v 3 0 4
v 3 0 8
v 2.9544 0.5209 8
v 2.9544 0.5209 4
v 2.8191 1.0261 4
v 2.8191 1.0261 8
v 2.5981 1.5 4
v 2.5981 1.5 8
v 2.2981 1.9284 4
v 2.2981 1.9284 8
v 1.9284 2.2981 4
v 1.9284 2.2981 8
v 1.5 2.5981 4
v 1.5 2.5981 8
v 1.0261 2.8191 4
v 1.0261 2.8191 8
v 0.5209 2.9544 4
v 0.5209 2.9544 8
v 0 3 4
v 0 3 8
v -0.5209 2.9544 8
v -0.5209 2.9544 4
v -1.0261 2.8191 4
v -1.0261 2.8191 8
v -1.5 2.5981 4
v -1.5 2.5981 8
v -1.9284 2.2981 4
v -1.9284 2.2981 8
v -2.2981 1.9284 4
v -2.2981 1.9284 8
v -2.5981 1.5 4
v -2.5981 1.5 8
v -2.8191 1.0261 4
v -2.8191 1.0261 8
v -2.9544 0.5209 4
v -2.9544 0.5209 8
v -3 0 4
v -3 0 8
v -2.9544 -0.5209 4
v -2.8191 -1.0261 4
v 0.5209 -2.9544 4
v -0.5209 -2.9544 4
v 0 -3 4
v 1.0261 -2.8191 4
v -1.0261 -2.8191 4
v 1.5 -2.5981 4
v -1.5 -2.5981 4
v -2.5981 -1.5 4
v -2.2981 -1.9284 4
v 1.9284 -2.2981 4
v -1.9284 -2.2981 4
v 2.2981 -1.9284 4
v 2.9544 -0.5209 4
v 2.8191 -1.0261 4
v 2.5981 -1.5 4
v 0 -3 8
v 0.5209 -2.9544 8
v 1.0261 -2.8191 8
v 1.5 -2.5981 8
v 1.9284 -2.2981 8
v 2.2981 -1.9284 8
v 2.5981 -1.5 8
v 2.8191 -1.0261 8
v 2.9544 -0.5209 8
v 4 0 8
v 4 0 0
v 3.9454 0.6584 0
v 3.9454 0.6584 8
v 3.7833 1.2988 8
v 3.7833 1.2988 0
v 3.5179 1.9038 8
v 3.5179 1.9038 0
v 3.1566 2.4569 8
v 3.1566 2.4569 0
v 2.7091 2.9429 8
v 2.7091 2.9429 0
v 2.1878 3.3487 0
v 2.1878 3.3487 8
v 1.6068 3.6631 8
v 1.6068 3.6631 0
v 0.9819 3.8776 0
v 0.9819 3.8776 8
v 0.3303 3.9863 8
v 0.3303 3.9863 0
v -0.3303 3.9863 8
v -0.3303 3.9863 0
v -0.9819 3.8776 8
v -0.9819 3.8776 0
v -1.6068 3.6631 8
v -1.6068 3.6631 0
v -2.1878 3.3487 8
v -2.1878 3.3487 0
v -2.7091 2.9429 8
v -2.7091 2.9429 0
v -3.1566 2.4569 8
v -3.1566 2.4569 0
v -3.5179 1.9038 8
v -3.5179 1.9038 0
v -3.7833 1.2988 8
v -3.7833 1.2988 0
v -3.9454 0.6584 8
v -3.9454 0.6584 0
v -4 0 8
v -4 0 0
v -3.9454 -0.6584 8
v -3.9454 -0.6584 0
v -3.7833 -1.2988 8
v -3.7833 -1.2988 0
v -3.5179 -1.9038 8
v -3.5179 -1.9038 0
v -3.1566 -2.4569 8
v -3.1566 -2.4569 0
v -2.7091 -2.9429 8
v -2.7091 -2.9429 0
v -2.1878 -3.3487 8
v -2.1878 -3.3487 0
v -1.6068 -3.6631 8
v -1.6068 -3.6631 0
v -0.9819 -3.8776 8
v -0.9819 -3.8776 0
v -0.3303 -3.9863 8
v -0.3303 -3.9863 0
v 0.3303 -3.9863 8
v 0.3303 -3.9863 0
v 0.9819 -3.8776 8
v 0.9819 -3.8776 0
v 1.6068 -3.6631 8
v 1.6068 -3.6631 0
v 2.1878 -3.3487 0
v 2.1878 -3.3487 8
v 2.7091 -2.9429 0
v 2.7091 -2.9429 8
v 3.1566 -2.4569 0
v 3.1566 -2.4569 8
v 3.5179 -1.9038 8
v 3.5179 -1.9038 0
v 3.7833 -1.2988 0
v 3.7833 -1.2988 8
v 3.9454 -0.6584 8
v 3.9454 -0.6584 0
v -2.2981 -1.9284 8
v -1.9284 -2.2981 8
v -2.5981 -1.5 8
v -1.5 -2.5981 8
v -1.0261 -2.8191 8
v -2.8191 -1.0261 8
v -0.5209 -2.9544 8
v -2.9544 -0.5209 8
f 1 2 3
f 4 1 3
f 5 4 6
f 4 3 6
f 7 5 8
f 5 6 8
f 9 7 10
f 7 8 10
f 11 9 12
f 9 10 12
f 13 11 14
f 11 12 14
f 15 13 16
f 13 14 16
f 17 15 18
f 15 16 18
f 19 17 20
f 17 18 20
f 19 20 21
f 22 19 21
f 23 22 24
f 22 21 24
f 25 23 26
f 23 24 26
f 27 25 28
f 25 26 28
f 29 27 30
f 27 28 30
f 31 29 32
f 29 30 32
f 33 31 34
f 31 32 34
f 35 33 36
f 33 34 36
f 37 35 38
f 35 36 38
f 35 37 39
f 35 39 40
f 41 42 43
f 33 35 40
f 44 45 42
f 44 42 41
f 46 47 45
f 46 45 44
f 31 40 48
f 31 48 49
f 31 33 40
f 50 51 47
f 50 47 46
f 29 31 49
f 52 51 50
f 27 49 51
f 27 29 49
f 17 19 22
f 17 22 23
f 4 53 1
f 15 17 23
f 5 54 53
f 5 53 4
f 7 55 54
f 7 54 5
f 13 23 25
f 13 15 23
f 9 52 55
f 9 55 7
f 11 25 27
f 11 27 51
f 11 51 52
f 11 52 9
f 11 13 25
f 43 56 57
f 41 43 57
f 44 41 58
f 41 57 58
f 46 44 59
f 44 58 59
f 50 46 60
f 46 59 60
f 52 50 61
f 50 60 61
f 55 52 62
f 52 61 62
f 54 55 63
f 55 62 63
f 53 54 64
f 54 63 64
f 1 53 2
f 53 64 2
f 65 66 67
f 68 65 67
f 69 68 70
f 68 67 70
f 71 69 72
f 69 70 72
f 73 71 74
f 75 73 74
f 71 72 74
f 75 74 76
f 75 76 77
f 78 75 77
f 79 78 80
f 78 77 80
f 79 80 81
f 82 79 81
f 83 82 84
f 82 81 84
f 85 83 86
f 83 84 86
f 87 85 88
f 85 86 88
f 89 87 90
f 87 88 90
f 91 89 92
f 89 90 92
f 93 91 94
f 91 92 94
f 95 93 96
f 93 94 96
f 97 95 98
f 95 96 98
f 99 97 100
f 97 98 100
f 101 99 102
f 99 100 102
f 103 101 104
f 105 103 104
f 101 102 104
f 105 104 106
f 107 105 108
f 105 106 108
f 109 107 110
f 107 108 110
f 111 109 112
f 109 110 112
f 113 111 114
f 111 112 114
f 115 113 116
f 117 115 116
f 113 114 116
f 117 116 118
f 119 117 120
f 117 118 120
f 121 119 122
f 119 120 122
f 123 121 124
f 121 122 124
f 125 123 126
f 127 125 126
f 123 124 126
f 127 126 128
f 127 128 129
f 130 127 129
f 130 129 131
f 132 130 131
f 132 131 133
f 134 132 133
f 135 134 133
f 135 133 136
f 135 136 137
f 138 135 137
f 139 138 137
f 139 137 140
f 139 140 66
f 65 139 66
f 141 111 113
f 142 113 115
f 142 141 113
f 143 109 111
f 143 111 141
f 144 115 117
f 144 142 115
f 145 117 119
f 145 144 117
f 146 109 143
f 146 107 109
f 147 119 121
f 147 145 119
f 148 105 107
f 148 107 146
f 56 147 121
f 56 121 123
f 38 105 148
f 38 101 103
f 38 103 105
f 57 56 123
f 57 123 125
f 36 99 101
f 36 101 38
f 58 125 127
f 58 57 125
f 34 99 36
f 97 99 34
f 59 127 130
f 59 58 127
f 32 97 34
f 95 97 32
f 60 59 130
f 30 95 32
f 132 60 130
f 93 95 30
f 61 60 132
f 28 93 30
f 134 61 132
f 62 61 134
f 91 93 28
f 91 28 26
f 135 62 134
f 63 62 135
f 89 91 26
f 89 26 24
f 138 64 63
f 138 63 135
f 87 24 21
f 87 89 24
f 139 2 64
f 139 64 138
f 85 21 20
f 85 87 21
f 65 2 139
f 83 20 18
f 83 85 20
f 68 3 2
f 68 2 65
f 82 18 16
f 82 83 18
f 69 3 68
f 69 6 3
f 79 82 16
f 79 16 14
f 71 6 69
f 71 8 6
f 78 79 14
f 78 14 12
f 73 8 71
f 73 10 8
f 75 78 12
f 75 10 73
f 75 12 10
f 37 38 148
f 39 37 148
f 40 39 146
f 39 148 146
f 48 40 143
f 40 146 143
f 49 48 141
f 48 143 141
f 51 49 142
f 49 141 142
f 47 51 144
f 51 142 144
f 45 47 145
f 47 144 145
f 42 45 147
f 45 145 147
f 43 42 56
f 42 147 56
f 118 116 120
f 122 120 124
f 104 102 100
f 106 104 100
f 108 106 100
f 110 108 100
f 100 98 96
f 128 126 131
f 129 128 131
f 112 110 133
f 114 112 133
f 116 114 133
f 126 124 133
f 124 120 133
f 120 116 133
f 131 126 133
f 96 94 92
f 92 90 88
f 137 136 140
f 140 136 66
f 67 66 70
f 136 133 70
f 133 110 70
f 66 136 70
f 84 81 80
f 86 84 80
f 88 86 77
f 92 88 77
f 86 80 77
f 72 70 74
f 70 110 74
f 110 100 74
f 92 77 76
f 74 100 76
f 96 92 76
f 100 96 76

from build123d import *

# Parameters (mm, degrees)
F0_R     = 4
F1_DEPTH = 8
F3_DEPTH = 4


with BuildPart() as f1:
    # F0 (on Top) → F1 (new body)
    with BuildSketch(Plane.XY):
        Circle(F0_R)
    extrude(amount=F1_DEPTH)

    # F2 (on face) → F3 (cut)
    with BuildSketch(Plane.XY.offset(8)):
        with BuildLine():
            ThreePointArc((3, 0), (2.12132, 2.12132), (0, 3))
            ThreePointArc((0, 3), (-2.12132, 2.12132), (-3, 0))
            ThreePointArc((-3, 0), (-2.12132, -2.12132), (0, -3))
            ThreePointArc((0, -3), (2.12132, -2.12132), (3, 0))
        make_face()
    extrude(amount=-F3_DEPTH, mode=Mode.SUBTRACT)


solid = f1.part
